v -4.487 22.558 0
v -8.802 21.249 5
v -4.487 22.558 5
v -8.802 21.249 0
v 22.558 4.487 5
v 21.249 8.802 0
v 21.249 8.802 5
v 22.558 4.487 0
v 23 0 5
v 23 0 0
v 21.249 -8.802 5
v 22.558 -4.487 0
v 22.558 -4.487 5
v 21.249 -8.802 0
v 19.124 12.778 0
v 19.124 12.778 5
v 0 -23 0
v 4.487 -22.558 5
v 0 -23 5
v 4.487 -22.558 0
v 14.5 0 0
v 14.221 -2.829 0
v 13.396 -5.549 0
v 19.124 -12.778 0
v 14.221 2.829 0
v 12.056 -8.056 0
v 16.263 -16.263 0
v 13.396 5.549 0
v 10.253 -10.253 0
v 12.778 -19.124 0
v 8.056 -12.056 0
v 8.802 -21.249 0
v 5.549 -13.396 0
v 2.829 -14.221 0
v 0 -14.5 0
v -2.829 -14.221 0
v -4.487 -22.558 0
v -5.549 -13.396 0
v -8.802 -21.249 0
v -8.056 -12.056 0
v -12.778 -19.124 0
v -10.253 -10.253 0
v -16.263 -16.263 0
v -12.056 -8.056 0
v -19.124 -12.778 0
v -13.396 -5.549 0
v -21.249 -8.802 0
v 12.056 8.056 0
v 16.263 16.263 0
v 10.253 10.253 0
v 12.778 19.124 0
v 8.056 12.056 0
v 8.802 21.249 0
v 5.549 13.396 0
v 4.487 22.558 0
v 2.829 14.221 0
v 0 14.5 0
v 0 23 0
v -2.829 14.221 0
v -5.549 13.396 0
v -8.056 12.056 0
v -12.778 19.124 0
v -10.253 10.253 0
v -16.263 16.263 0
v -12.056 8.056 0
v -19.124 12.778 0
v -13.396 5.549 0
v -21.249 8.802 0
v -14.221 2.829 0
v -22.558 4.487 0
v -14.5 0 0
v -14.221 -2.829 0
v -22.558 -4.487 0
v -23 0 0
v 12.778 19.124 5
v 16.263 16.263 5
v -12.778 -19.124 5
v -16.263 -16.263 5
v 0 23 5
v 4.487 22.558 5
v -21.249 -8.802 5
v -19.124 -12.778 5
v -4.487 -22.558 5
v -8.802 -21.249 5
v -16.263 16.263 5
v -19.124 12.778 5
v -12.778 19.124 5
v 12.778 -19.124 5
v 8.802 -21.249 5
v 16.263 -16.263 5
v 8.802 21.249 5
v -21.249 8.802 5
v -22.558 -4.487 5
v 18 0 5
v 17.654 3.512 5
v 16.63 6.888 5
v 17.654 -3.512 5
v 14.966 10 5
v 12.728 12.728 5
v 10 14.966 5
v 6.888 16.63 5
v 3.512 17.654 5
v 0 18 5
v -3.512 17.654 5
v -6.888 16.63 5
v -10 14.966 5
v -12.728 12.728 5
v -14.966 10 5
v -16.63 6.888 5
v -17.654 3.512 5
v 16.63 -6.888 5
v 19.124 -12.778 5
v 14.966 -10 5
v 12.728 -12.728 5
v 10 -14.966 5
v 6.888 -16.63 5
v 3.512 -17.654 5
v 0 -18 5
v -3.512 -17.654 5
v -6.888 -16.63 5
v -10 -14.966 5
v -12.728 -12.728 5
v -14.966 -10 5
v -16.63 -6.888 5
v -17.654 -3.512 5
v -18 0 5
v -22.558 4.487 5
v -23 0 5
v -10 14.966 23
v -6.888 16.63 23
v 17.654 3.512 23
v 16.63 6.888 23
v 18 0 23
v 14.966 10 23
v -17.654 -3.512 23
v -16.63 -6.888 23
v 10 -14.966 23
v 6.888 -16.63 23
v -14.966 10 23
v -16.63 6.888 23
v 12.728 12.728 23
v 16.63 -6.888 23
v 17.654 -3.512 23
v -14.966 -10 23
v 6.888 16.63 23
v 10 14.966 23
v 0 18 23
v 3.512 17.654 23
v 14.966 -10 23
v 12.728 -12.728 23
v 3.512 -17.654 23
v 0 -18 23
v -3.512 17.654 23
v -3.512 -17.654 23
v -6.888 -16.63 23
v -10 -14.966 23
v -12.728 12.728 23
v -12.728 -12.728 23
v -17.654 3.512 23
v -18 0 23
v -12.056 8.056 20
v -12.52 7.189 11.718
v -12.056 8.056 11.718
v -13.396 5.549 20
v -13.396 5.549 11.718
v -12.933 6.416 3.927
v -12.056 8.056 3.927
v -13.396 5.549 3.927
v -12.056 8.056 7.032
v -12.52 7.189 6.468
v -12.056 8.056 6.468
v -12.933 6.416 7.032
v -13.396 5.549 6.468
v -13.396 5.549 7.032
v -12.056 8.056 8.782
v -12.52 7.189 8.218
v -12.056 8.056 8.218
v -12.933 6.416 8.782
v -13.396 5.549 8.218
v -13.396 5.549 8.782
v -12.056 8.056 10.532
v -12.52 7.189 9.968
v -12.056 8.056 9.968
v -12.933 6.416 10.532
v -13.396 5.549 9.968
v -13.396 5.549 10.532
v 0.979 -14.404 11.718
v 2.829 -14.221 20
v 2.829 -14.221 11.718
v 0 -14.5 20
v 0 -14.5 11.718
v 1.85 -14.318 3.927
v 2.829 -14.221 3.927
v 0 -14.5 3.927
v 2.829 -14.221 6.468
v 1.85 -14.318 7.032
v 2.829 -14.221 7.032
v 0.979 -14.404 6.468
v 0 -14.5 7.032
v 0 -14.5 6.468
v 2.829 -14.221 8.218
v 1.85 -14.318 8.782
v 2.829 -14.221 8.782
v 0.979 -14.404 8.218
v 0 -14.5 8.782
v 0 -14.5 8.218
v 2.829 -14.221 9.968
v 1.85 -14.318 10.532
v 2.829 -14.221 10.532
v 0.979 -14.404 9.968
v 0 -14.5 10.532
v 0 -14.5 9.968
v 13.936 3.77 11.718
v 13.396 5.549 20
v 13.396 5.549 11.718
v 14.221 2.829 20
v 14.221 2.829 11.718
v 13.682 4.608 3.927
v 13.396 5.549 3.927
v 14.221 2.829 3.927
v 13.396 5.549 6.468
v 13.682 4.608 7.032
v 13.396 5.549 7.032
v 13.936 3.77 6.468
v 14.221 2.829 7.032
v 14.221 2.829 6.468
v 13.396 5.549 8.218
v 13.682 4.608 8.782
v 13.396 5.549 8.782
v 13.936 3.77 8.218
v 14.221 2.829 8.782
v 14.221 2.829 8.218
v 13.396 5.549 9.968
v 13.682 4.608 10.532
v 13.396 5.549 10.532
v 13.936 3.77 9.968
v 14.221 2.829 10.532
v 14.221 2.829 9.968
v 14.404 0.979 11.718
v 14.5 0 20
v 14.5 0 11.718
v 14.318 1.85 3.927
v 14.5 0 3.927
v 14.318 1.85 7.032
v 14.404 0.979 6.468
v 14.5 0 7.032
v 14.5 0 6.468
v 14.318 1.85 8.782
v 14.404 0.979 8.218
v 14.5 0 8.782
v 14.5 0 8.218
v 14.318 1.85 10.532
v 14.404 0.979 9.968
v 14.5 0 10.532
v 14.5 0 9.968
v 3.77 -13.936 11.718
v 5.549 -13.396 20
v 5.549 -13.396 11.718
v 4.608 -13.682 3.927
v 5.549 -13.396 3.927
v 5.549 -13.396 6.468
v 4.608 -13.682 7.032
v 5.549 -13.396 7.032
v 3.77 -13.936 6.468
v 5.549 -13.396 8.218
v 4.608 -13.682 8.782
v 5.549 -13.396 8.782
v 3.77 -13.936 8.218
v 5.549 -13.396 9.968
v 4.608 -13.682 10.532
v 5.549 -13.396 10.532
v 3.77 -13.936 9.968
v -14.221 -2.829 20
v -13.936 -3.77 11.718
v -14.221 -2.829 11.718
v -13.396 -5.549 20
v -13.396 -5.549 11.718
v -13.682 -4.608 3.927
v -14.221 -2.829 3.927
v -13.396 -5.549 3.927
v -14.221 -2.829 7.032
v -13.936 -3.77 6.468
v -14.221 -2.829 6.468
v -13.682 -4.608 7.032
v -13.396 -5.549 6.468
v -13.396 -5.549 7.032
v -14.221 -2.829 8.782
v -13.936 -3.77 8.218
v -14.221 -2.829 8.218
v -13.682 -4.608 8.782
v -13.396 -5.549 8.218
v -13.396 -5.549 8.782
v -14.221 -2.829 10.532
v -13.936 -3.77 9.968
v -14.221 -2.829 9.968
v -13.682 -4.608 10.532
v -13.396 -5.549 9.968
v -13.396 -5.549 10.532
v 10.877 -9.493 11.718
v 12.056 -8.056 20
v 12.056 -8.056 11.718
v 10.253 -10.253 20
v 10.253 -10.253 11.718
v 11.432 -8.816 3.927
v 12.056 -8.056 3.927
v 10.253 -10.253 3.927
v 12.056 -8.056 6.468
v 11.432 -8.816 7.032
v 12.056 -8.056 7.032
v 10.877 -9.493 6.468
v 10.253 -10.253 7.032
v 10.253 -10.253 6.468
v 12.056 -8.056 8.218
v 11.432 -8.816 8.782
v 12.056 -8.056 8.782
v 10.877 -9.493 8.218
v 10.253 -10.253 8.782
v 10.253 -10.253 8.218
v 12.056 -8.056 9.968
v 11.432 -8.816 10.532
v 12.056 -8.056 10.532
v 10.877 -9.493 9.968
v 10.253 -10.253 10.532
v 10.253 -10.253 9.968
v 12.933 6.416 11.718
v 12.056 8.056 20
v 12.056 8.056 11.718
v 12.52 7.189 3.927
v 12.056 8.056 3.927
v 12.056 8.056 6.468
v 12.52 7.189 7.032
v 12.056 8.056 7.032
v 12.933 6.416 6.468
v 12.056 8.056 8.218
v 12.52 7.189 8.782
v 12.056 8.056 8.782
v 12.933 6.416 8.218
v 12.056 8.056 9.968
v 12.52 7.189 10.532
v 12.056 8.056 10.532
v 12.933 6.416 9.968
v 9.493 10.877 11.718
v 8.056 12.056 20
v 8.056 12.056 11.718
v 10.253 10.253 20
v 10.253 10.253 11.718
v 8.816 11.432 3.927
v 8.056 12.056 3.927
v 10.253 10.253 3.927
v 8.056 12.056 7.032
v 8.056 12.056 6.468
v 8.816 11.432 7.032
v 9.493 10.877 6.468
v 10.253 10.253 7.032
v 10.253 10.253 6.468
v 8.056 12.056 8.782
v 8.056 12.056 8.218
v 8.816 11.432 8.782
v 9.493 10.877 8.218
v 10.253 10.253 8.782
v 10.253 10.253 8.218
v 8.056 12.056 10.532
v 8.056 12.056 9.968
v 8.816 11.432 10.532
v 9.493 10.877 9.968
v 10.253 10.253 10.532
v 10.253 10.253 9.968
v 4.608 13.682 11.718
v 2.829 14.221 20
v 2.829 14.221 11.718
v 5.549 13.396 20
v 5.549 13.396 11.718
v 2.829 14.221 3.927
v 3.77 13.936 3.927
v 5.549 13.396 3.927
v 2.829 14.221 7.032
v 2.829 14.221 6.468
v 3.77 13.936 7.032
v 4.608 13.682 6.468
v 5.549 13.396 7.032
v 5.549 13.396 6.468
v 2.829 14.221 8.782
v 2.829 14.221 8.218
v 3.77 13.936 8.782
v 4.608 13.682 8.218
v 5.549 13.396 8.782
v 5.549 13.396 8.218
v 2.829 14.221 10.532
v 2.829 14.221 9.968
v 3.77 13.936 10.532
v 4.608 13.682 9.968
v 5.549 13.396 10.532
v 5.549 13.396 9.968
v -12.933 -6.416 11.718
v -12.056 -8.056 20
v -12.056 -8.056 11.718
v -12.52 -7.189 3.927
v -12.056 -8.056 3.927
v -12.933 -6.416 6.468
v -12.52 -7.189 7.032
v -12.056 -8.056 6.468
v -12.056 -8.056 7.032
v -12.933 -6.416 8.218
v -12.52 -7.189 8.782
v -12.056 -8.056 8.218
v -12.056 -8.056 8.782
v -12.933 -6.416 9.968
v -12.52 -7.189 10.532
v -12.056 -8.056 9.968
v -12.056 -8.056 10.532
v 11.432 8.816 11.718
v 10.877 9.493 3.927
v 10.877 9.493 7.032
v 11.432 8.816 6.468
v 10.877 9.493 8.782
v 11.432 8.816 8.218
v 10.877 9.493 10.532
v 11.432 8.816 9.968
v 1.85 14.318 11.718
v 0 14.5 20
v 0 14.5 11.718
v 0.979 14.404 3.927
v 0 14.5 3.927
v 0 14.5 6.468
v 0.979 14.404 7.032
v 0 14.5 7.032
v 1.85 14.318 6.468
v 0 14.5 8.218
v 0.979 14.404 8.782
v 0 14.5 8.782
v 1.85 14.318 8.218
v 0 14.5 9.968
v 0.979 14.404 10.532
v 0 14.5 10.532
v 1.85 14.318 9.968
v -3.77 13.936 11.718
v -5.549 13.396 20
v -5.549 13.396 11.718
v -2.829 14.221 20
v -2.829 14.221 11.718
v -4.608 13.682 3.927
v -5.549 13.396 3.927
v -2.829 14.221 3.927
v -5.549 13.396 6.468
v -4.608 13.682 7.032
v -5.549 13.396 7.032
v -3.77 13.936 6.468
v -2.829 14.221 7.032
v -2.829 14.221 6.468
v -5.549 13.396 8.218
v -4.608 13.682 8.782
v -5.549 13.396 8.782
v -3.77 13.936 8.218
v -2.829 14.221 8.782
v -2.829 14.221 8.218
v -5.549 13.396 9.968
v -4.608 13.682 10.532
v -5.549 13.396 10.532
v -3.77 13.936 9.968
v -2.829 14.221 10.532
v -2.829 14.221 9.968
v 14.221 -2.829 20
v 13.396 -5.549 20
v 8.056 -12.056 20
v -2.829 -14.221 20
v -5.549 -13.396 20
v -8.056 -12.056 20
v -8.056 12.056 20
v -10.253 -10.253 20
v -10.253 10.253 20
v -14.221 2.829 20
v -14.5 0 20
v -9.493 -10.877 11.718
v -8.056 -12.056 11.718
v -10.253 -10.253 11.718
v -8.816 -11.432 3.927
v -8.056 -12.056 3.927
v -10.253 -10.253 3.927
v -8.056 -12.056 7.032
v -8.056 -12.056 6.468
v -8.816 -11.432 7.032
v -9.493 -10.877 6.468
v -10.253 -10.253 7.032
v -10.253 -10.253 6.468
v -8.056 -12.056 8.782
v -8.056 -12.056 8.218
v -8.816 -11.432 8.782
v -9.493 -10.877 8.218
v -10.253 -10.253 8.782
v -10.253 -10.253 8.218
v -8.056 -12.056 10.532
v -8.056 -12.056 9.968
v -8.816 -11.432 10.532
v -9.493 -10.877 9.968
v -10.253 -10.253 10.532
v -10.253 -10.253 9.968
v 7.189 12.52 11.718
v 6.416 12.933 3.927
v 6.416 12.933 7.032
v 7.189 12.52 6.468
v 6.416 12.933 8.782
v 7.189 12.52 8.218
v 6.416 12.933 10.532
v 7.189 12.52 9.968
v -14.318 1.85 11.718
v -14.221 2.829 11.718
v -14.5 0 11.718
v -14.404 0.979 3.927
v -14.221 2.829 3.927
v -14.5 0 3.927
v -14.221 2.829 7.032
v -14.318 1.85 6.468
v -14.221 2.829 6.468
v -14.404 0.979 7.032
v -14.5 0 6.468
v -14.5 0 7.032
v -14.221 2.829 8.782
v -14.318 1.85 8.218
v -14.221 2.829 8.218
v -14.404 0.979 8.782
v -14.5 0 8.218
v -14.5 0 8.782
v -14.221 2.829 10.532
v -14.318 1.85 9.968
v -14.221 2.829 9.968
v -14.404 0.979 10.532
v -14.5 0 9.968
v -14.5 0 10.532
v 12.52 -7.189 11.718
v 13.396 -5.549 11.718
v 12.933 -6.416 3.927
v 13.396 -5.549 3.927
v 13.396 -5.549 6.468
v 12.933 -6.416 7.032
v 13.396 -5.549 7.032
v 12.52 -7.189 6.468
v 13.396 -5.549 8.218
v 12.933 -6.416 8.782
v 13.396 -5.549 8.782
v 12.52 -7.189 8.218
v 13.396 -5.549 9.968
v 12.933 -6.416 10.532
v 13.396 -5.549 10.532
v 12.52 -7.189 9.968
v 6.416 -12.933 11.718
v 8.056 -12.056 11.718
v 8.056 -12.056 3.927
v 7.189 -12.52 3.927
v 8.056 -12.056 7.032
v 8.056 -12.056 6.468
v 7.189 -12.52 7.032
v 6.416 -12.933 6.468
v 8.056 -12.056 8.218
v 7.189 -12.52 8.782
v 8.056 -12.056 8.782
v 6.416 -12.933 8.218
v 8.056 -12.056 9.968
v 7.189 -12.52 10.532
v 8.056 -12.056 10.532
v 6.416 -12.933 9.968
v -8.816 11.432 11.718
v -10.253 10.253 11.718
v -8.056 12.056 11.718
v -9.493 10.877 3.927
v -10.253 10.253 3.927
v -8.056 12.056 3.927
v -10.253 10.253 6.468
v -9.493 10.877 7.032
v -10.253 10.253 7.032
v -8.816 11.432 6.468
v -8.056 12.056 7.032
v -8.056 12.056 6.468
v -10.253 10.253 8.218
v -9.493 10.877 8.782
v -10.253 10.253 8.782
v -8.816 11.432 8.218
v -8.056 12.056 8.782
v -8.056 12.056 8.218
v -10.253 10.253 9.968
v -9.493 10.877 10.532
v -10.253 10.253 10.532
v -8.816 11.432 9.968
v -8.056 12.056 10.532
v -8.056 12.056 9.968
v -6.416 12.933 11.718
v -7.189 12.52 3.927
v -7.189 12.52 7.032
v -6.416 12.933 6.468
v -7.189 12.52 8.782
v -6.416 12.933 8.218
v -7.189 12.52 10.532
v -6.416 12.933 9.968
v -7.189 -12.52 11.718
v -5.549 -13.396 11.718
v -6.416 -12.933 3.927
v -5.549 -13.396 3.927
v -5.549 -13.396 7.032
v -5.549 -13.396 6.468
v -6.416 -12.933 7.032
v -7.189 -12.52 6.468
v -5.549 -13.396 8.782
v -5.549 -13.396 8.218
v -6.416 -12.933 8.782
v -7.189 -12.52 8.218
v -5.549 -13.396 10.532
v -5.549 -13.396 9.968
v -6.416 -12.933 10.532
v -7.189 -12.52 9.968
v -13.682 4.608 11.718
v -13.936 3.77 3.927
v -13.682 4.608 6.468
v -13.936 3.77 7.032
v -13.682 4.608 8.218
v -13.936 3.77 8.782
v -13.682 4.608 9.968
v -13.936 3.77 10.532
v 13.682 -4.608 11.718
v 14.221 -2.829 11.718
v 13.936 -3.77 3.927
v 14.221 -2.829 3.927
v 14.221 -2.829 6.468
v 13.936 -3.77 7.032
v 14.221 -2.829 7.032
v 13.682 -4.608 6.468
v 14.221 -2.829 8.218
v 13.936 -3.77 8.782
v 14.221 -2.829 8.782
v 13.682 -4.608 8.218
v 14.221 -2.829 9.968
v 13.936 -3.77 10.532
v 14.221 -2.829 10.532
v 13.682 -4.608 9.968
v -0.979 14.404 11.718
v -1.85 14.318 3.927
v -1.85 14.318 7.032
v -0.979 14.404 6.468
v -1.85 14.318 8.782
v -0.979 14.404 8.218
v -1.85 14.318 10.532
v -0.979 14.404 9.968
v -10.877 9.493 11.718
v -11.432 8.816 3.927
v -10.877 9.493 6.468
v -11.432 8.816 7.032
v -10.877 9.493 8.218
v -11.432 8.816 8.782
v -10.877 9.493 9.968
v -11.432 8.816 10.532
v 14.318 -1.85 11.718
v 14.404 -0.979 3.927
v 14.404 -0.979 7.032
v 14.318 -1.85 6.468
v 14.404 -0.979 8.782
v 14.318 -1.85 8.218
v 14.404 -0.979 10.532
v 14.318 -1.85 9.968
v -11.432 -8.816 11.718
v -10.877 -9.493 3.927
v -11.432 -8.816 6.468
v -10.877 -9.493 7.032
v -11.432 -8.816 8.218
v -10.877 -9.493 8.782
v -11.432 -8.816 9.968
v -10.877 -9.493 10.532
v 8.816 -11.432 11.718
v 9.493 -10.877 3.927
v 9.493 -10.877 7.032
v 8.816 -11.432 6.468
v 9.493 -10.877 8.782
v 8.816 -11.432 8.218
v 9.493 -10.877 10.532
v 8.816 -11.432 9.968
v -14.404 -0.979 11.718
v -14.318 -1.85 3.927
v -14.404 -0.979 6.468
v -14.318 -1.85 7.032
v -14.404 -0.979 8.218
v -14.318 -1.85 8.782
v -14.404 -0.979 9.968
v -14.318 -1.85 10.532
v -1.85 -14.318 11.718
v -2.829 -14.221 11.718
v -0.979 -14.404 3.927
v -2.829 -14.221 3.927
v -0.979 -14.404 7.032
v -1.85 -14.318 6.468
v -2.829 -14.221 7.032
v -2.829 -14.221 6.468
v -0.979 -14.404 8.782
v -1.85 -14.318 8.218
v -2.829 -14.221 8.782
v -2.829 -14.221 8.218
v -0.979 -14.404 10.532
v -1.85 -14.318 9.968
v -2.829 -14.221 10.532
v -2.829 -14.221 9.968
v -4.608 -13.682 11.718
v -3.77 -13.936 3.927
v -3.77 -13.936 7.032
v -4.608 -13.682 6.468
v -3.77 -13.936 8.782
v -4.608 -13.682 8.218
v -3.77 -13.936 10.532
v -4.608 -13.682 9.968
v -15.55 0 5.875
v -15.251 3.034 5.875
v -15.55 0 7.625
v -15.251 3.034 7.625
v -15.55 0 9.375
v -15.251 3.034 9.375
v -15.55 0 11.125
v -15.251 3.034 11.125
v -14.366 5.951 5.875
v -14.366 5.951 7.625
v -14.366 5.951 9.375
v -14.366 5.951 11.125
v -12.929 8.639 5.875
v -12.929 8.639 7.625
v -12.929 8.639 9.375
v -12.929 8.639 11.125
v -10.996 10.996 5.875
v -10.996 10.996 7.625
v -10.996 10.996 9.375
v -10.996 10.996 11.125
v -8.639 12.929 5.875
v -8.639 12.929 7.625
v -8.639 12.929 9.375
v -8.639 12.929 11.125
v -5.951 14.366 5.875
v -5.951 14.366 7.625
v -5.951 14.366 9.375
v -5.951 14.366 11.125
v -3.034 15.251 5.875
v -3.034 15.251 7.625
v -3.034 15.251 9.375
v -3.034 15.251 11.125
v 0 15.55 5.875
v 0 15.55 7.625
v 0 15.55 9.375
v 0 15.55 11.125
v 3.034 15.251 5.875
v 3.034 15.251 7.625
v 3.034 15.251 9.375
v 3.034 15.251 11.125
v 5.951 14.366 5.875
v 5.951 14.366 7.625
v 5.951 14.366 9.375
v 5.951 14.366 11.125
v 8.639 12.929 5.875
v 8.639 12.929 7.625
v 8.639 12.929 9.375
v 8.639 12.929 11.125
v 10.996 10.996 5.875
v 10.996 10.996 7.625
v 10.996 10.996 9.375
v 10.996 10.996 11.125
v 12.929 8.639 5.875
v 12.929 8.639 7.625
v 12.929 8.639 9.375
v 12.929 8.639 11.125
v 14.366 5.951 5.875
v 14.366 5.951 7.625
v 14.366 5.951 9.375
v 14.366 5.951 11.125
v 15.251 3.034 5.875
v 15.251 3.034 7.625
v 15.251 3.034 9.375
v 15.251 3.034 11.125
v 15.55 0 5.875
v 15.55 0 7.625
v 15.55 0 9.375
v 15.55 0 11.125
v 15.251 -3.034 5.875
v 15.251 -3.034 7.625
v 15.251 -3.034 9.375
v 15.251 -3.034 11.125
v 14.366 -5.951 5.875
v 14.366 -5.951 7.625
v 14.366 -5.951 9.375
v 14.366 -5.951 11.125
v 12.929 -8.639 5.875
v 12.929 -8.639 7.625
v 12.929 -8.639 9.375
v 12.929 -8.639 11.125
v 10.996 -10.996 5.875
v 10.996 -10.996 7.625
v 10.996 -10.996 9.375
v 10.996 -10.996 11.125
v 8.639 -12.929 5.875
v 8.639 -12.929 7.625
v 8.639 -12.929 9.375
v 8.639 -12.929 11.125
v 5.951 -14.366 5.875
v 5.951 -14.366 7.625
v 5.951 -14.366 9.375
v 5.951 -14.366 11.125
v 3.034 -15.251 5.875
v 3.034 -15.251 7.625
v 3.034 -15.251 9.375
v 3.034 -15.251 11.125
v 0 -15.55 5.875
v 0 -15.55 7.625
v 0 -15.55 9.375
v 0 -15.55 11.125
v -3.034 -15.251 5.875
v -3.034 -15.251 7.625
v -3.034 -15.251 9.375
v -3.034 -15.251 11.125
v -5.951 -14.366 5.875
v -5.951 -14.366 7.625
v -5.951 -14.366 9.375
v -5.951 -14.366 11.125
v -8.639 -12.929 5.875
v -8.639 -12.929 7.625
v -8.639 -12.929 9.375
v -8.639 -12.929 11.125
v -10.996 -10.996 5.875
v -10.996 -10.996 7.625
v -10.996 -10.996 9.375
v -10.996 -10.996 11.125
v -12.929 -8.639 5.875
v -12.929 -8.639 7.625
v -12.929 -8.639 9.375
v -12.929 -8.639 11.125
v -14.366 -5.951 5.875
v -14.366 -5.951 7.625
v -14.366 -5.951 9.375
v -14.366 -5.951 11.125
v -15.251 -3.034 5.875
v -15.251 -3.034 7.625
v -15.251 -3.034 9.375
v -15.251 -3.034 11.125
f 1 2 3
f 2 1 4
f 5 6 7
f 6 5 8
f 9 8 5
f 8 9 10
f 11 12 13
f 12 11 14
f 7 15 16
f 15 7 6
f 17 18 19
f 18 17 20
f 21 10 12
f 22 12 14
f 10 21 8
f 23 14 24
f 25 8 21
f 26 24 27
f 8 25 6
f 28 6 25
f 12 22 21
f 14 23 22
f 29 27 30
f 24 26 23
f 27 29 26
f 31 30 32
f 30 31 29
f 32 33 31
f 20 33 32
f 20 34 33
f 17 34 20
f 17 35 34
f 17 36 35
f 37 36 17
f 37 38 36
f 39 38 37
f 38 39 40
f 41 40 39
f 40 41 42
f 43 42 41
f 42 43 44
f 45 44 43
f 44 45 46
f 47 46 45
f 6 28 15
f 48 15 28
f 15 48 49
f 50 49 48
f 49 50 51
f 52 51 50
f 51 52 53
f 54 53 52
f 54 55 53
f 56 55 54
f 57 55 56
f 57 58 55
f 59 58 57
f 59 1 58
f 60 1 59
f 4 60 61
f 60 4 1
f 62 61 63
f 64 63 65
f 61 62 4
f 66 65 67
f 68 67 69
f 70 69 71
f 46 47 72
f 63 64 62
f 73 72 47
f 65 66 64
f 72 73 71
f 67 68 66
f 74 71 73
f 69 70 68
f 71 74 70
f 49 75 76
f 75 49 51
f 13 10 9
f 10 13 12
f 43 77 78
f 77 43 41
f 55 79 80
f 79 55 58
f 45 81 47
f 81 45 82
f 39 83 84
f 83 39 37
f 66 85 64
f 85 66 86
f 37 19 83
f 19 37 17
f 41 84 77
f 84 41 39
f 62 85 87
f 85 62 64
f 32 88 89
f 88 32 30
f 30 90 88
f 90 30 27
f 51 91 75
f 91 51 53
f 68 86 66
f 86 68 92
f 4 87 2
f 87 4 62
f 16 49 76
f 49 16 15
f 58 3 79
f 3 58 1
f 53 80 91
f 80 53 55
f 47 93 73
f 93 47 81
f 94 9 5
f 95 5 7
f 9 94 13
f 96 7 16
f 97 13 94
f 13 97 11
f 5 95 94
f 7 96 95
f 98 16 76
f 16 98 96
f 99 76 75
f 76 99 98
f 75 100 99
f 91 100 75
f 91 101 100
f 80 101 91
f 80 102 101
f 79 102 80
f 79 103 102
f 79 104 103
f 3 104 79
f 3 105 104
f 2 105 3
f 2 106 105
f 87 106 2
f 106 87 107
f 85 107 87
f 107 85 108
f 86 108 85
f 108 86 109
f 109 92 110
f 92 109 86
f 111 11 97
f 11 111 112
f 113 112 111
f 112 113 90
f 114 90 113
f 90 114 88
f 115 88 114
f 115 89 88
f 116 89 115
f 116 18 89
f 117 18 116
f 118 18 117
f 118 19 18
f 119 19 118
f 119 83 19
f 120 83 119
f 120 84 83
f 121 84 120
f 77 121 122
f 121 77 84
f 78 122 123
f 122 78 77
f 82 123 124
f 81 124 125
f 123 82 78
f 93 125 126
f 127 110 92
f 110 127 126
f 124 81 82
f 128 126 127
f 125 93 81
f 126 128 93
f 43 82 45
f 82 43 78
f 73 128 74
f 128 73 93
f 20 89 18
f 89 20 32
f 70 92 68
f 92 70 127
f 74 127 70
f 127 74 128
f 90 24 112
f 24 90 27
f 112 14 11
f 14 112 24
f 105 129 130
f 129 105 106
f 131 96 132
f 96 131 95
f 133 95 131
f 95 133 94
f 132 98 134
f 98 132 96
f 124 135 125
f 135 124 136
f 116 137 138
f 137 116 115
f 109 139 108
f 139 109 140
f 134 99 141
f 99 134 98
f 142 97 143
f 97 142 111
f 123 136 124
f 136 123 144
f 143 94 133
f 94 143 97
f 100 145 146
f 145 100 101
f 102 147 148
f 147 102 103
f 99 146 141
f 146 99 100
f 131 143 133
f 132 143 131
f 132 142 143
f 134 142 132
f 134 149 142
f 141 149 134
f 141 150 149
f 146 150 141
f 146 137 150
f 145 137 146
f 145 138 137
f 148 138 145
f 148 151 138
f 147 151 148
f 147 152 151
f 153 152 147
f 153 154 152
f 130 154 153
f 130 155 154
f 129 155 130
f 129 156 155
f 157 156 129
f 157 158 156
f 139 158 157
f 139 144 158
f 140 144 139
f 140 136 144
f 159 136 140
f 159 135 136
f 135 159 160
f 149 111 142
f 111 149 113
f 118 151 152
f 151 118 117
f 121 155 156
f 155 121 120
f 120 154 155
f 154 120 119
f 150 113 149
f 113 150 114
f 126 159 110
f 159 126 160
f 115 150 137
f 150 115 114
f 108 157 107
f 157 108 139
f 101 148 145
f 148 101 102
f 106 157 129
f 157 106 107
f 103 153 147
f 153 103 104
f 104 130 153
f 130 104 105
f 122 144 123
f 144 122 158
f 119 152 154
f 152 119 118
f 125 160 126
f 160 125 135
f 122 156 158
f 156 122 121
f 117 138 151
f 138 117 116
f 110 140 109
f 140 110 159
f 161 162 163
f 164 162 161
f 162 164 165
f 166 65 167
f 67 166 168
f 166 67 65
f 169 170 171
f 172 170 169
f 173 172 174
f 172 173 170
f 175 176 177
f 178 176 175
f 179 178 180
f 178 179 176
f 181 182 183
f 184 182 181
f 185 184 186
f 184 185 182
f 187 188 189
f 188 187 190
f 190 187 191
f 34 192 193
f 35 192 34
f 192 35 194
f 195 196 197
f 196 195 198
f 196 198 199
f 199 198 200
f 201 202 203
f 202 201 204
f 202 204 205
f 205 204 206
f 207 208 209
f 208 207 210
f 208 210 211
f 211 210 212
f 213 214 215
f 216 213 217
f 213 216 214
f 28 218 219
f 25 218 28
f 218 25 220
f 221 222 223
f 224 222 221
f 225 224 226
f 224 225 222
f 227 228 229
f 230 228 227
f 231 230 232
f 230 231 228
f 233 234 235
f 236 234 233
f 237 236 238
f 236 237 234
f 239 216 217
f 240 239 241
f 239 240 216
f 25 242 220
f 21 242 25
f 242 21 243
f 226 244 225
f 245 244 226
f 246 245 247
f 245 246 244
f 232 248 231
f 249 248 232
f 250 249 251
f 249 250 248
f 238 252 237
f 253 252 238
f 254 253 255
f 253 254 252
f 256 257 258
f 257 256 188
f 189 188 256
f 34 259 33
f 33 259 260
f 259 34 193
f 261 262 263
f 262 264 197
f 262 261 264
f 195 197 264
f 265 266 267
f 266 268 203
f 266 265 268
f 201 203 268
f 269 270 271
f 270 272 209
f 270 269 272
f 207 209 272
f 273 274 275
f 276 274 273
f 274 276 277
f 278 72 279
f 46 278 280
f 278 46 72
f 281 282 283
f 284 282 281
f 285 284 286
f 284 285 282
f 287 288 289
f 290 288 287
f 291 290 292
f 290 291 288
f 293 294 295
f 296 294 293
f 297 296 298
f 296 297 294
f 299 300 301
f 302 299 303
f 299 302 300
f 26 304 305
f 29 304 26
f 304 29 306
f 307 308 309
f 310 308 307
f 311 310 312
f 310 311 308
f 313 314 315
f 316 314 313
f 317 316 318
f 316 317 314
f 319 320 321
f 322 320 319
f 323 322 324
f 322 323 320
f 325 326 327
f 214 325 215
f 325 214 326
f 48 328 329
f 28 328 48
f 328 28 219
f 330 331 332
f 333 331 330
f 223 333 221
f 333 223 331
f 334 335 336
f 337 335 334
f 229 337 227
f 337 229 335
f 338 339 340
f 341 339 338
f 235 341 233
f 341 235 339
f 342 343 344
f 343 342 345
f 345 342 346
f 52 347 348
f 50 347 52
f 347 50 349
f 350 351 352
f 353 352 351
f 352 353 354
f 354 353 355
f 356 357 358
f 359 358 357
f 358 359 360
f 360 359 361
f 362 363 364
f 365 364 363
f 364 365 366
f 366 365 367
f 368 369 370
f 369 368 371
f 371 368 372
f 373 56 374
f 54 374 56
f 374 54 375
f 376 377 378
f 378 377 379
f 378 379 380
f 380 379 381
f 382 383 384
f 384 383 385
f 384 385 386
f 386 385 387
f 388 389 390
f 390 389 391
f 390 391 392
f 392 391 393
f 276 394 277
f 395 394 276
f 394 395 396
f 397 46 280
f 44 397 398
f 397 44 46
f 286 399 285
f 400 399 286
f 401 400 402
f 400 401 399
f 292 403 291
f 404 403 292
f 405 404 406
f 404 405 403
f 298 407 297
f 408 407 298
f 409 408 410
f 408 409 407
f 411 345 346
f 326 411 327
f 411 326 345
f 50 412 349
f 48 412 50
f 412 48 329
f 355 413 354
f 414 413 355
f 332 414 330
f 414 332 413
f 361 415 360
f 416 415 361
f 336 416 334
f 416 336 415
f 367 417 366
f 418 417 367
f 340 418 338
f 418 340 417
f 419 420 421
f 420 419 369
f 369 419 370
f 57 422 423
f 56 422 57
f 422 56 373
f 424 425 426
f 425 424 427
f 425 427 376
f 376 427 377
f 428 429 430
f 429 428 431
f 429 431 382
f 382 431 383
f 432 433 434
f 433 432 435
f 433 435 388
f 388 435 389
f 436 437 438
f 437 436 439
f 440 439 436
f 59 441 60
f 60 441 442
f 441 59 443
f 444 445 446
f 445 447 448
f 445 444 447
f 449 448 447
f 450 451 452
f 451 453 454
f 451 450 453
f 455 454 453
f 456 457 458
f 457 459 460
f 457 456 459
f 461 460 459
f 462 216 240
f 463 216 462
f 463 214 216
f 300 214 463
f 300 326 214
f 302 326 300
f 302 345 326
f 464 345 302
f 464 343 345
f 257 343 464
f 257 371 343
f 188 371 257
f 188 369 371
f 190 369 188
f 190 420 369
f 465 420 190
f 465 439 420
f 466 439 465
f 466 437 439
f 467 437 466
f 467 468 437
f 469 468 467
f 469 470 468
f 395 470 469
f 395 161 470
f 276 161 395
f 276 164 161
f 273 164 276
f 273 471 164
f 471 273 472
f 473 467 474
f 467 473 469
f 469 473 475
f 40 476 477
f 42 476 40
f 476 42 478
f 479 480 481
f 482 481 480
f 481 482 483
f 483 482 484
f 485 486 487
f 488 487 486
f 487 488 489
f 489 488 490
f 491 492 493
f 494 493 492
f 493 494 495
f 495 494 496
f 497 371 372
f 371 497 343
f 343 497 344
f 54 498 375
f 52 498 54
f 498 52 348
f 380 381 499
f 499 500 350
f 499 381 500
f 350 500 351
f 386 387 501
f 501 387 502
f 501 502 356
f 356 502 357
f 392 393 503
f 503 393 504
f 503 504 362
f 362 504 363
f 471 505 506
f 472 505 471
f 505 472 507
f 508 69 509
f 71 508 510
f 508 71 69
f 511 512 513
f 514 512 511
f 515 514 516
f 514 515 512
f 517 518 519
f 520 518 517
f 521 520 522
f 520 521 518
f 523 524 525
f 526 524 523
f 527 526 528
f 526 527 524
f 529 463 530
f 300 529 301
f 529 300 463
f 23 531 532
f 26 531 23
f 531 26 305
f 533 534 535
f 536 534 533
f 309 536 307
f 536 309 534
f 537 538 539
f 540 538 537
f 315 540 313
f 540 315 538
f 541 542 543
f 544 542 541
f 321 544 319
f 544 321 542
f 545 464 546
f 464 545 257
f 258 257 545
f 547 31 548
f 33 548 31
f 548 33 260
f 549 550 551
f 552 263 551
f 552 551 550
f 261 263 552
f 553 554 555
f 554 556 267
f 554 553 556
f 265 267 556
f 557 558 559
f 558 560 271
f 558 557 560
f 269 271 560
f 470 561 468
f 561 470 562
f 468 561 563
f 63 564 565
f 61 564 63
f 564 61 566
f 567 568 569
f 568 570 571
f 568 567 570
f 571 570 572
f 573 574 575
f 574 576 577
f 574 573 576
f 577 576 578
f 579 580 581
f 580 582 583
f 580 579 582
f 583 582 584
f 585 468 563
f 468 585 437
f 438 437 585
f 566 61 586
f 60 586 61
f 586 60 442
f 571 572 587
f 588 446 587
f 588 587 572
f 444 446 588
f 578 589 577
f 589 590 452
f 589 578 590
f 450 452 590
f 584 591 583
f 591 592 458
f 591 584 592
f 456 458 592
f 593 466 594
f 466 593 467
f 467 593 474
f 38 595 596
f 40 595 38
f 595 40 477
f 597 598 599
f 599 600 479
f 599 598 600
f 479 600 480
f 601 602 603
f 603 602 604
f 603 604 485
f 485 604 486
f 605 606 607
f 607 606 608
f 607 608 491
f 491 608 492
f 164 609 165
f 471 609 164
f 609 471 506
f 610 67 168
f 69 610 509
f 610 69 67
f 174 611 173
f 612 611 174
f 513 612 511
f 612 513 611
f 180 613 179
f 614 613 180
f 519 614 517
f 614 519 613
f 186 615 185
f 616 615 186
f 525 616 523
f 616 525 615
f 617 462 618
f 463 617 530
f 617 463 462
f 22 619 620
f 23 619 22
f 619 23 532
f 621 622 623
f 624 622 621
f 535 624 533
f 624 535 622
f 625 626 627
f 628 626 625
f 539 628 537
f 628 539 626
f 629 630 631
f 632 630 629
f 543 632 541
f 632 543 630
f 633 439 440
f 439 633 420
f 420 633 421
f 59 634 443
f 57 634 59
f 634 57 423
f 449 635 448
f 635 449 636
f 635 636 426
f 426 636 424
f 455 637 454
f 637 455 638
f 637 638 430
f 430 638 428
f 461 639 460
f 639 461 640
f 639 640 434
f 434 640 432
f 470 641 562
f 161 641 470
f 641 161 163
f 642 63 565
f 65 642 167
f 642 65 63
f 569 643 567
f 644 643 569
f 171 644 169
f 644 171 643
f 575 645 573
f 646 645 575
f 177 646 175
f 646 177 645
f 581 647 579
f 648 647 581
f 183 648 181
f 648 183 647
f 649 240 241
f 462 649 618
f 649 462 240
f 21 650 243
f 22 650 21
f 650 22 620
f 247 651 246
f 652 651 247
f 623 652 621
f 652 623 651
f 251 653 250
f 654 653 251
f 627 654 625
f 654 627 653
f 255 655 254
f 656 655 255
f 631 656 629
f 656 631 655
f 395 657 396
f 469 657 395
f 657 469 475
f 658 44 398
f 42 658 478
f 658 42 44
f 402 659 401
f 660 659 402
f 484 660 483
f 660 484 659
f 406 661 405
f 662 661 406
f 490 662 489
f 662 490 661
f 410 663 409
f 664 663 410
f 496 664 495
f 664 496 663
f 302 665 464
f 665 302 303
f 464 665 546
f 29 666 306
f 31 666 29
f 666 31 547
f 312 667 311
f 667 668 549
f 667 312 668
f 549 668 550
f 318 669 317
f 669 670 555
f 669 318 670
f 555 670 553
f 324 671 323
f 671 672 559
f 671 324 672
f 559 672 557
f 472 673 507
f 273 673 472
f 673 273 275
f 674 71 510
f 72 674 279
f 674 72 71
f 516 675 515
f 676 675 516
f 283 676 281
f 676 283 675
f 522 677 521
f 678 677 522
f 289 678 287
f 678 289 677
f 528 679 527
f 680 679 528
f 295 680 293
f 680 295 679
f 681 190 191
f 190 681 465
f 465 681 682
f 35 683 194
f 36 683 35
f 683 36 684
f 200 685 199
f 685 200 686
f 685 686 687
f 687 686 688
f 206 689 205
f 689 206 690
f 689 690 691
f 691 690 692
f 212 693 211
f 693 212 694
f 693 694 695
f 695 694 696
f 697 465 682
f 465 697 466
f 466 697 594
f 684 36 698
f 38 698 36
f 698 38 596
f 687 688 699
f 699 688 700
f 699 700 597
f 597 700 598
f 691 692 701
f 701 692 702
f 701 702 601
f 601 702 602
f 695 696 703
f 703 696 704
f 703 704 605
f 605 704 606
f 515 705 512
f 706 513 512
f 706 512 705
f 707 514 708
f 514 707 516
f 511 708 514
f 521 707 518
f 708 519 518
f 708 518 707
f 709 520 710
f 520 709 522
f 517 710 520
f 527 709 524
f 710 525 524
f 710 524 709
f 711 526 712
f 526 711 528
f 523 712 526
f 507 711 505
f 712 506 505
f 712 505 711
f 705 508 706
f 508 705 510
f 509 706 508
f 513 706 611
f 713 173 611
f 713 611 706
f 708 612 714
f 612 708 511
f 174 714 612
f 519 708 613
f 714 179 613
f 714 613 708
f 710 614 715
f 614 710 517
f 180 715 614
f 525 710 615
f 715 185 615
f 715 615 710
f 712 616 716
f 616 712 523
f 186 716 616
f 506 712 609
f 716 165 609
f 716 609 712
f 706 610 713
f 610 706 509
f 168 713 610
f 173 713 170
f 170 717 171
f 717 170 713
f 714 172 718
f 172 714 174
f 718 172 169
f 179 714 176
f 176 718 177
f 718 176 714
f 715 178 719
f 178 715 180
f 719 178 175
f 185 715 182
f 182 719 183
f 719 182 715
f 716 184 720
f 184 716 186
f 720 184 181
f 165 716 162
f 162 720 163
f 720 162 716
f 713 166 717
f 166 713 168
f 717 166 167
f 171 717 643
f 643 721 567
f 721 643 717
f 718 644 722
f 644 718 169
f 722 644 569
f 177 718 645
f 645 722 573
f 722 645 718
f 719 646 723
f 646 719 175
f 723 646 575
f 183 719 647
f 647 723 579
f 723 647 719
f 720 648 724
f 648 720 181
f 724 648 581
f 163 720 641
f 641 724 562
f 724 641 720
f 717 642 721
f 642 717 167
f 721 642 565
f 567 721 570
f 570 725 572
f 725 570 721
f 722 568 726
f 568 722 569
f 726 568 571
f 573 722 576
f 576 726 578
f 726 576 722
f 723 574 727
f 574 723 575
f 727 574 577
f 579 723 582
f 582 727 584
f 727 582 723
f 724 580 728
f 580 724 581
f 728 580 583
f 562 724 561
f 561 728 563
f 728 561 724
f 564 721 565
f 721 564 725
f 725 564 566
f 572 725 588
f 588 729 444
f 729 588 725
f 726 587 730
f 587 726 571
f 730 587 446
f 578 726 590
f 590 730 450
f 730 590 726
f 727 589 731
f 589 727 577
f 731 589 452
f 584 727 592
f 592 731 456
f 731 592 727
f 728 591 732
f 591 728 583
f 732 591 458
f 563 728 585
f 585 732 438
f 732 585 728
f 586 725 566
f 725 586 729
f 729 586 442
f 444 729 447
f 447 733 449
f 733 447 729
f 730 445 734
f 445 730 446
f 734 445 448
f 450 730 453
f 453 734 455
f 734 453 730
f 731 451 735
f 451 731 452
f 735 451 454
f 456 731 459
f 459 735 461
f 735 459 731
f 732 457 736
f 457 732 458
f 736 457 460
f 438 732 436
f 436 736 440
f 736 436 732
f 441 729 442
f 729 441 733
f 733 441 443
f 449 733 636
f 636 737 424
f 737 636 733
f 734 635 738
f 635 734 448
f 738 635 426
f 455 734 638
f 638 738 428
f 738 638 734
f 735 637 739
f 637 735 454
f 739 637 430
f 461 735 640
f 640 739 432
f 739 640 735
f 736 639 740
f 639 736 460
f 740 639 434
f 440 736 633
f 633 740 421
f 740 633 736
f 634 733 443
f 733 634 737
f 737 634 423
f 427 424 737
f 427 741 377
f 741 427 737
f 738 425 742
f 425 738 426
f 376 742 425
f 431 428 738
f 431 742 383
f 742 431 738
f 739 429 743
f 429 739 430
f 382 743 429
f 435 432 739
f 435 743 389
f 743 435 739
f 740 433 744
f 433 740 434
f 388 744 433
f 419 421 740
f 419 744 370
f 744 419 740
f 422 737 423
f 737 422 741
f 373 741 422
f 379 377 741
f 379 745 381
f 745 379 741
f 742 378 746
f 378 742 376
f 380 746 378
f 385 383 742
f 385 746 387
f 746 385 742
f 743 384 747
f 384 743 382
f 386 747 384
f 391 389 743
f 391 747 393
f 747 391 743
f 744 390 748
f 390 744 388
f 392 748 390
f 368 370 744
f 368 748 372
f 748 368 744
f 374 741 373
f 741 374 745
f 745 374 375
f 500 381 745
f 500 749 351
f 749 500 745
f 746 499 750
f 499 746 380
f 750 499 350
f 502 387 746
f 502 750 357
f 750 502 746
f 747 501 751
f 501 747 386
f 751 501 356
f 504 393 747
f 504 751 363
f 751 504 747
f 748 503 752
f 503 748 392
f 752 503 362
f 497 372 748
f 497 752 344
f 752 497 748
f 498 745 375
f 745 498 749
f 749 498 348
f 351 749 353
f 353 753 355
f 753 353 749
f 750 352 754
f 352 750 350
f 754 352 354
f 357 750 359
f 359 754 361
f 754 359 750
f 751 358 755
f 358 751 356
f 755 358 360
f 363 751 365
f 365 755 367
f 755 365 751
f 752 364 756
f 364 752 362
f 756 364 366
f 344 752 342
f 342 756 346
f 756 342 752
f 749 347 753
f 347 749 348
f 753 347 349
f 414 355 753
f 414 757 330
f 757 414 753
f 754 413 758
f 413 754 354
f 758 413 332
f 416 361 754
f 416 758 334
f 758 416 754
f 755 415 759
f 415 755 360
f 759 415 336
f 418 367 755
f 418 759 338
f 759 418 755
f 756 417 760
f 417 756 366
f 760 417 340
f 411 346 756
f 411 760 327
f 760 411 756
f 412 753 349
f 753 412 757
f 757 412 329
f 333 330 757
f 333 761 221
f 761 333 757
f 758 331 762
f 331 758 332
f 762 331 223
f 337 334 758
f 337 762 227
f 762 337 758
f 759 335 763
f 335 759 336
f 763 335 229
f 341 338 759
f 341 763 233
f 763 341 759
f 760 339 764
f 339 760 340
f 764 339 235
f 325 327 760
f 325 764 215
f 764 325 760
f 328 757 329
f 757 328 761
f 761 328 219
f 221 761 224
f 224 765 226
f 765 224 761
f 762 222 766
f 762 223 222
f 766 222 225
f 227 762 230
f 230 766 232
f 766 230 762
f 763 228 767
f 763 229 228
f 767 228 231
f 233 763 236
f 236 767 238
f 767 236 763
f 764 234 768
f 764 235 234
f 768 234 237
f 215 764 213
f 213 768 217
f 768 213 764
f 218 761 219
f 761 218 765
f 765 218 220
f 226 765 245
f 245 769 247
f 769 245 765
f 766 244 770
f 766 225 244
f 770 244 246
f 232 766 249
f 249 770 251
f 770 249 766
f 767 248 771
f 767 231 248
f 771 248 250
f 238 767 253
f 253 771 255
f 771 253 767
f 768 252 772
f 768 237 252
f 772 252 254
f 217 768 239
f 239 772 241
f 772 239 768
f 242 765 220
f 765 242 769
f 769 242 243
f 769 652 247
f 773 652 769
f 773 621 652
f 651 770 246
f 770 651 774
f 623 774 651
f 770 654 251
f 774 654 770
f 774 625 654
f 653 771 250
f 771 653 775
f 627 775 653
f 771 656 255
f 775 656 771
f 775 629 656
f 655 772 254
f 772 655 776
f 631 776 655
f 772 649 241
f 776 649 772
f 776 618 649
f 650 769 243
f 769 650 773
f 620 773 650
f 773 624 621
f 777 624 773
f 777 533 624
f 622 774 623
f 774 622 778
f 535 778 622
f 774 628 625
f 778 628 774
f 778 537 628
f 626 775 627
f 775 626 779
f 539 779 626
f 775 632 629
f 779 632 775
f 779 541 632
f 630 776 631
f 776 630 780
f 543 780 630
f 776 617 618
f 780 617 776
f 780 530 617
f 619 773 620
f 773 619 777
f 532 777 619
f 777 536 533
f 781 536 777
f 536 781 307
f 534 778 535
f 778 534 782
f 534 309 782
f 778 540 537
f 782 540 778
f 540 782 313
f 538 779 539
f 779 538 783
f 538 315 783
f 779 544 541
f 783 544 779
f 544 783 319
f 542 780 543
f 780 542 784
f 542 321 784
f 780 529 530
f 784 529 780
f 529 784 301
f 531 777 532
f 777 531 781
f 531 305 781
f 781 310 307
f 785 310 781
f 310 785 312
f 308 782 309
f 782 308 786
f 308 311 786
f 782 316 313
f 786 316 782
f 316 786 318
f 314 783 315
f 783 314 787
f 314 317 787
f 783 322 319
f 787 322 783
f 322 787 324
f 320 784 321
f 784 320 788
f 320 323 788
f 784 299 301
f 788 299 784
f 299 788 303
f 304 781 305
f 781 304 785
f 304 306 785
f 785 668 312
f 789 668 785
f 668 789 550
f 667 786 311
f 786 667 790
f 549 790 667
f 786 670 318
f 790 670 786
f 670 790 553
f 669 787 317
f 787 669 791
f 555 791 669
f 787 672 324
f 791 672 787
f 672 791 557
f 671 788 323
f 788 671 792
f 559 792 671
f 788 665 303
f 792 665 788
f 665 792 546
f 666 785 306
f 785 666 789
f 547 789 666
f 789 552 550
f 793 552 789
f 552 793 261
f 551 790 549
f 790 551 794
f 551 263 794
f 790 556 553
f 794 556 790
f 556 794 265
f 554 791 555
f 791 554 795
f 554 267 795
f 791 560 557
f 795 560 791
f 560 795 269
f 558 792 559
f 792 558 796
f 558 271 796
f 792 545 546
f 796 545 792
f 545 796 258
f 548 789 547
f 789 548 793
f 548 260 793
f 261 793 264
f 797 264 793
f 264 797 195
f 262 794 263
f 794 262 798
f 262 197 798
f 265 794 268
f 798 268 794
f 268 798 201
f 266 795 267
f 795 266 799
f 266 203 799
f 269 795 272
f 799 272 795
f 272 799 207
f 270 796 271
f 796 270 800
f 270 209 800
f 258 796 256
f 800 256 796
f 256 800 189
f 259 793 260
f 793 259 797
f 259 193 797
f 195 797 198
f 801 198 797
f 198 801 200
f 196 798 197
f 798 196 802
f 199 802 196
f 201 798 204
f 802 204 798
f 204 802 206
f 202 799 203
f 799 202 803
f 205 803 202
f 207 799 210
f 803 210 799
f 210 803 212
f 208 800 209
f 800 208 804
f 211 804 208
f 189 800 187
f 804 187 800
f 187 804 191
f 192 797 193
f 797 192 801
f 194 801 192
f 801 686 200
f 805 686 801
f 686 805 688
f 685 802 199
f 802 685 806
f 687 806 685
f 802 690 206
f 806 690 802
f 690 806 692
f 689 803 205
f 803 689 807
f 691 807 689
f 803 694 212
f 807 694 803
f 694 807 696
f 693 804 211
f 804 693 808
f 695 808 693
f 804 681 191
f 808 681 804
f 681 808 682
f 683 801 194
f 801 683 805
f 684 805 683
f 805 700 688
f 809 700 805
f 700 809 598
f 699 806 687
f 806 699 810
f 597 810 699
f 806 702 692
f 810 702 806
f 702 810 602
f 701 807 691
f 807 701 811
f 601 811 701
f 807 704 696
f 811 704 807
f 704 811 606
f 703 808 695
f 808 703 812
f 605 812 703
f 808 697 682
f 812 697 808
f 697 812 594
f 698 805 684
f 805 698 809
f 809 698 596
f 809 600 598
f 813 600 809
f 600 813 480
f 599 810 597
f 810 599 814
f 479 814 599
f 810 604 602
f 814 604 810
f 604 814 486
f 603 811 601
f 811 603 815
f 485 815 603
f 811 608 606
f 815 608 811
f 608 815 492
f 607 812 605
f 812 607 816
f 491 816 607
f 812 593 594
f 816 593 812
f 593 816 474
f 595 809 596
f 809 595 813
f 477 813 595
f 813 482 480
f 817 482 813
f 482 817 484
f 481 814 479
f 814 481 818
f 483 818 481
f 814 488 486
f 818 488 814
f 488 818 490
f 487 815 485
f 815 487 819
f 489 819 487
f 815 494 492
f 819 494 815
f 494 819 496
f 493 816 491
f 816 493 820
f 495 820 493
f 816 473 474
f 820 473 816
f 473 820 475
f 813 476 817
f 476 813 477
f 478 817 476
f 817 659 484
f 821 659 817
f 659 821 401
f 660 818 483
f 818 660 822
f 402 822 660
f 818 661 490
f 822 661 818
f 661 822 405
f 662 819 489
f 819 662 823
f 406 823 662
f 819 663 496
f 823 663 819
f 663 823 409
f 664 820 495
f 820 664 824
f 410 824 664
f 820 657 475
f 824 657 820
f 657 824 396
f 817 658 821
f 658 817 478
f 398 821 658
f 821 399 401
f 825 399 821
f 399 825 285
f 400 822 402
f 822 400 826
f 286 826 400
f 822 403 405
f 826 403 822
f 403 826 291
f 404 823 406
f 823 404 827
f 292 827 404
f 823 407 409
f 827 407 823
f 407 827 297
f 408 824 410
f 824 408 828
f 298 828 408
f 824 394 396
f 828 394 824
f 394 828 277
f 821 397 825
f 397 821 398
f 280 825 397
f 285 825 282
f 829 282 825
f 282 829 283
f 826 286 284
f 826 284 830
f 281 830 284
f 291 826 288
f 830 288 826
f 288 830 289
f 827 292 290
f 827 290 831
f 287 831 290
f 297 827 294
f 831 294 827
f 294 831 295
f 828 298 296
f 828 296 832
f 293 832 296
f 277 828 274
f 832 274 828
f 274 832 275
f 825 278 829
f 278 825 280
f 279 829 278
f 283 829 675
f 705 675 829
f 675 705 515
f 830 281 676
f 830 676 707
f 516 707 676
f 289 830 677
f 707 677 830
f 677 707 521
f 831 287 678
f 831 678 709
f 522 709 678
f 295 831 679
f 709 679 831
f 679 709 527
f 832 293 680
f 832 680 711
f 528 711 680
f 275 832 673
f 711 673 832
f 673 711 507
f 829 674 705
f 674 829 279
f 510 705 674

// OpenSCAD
$fn = 32;

// ----------------------------------------------------------------------
// Threaded cap: 36 mm body, 18 mm tall, 29 mm threaded bore
// ----------------------------------------------------------------------

// --- parameters (mm) ---
outer_d = 36;             // cap outside diameter
body_h = 18;              // cap height
top_t = 3;                // closed top thickness
bore_d = 29;              // bore core diameter
pitch = 1.75;             // thread pitch
thread_d = 1.05;          // thread depth
thread_z = 3;             // thread start above the rim
thread_h = 9;             // threaded height
flange_d = 46;            // flange diameter
flange_t = 5;             // flange thickness

difference() {
  union() {
    cylinder(h = 5, d = flange_d);
    translate([0, 0, 4.5]) cylinder(h = 18.5, d = outer_d);
  }
  /* threaded bore, closed at the top */
  translate([0, 0, -2.5]) cylinder(h = 22.5, d = bore_d);
  translate([0, 0, 3]) rotate_extrude() polygon([[13.5, 0], [13.5, 9], [14, 9], [15.55, 8.125], [14, 7.25], [15.55, 6.375], [14, 5.5], [15.55, 4.625], [14, 3.75], [15.55, 2.875], [14, 0], [13.5, 0]]);
}
